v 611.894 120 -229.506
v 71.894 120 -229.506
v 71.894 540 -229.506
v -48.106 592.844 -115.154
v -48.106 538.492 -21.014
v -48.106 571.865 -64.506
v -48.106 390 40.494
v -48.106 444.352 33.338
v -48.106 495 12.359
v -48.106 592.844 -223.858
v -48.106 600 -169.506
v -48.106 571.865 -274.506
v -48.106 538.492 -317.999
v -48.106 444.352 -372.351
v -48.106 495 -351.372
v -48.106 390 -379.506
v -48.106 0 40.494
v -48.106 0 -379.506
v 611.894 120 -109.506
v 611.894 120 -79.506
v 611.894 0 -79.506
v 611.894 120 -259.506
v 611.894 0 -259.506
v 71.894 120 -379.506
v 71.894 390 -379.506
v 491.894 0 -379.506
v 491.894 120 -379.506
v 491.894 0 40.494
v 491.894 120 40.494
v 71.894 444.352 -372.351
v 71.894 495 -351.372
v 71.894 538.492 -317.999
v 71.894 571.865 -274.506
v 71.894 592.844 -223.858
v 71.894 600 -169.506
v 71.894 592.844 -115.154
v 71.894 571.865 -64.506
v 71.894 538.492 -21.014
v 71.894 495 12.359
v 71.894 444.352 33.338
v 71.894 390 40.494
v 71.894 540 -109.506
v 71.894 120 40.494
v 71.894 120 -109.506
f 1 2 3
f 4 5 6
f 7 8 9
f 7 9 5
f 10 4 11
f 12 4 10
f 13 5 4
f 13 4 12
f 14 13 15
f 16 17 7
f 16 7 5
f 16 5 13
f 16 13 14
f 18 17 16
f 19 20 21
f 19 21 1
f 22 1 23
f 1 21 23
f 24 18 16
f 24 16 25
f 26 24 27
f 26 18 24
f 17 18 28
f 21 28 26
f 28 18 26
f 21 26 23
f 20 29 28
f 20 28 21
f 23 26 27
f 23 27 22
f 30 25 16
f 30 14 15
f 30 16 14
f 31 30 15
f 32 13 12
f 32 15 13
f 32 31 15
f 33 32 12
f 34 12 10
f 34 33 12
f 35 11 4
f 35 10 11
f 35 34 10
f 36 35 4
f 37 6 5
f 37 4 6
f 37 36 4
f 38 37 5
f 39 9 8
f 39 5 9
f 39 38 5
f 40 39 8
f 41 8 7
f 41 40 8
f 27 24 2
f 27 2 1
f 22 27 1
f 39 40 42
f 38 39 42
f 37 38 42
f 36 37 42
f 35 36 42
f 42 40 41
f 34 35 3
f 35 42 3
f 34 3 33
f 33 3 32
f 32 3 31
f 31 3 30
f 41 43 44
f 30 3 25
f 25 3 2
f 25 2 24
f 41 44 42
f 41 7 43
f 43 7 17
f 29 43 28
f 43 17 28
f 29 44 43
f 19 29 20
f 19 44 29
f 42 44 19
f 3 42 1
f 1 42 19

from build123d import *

# Parameters (mm, degrees)
SKETCH1_W           = 660
SKETCH1_H           = 420
BOSS_EXTRUDE1_DEPTH = 120
SKETCH2_W           = 120
SKETCH2_H           = 420
BOSS_EXTRUDE2_DEPTH = 480
FILLET1_RADIUS      = 210
FILLET1_LENGTH      = 120
CHAMFER1_START      = 376.454614173
CHAMFER1_OUTLINE_W  = 172
CHAMFER1_OUTLINE_H  = 120
CHAMFER1_DEPTH      = 85.545385827
CHAMFER2_START      = 616.17299772
CHAMFER2_OUTLINE_W  = 173
CHAMFER2_OUTLINE_H  = 120
CHAMFER2_DEPTH      = 85.82700228
SKETCH4_W           = 120
SKETCH4_H           = 420
BOSS_EXTRUDE3_DEPTH = 540
CUT_EXTRUDE1_DEPTH  = 480


with BuildPart() as part:
    # Sketch1 → Boss-Extrude1 (new body)
    with BuildSketch(Plane(origin=(0, 0, 0), x_dir=(1, 0, 0), z_dir=(0, 1, 0))):
        with Locations((281.893715562, 169.506494581)):
            Rectangle(SKETCH1_W, SKETCH1_H)
    extrude(amount=BOSS_EXTRUDE1_DEPTH)

    # Sketch2 → Boss-Extrude2 (add)
    with BuildSketch(Plane(origin=(0, 120, 0), x_dir=(1, 0, 0), z_dir=(0, 1, 0))):
        with Locations((11.893715562, 169.506494581)):
            Rectangle(SKETCH2_W, SKETCH2_H)
    extrude(amount=BOSS_EXTRUDE2_DEPTH)

    # Fillet1: full round fillet: the end face becomes a half cylinder, R = half its width
    fillet1_face = Plane((11.893715562, 600, -169.506494581), x_dir=(1, 0, 0), z_dir=(0, 1, 0))  # on the end face: x along it, z out of the body
    fillet1_slab = fillet1_face.offset(-FILLET1_RADIUS / 2) * Box(FILLET1_LENGTH, 2 * FILLET1_RADIUS, FILLET1_RADIUS, mode=Mode.PRIVATE)  # the body's end, R deep
    fillet1_round = Plane((11.893715562, 390, -169.506494581), x_dir=(0, 1, 0), z_dir=(1, 0, 0)) * Cylinder(FILLET1_RADIUS, FILLET1_LENGTH, mode=Mode.PRIVATE)  # its axis R under the face
    add(fillet1_slab - fillet1_round, mode=Mode.SUBTRACT)

    # Chamfer1: read off the stored shape, not the designer's step
    # Chamfer1 outline → Chamfer1 (cut)
    with BuildSketch(Plane(origin=(0, 0, 0), x_dir=(0.7071067811865471, 0, -0.707106781186548), z_dir=(0.707106781186548, 0, 0.707106781186547)).offset(CHAMFER1_START)):
        with Locations((404, 60)):
            Rectangle(CHAMFER1_OUTLINE_W, CHAMFER1_OUTLINE_H)
    extrude(amount=CHAMFER1_DEPTH, mode=Mode.SUBTRACT)

    # Chamfer2: read off the stored shape, not the designer's step
    # Chamfer2 outline → Chamfer2 (cut)
    with BuildSketch(Plane(origin=(0, 0, 0), x_dir=(0.707106781186548, 0, 0.707106781186547), z_dir=(0.707106781186547, 0, -0.707106781186548)).offset(CHAMFER2_START)):
        with Locations((164.5, -60)):
            Rectangle(CHAMFER2_OUTLINE_W, CHAMFER2_OUTLINE_H)
    extrude(amount=CHAMFER2_DEPTH, mode=Mode.SUBTRACT)

    # Sketch4 → Boss-Extrude3 (add)
    with BuildSketch(Plane(origin=(71.893715562, 0, 0), x_dir=(0, 0, -1), z_dir=(1, 0, 0))):
        with Locations((169.506494581, 330)):
            Rectangle(SKETCH4_W, SKETCH4_H)
    extrude(amount=BOSS_EXTRUDE3_DEPTH)

    # Sketch7 → Cut-Extrude1 (cut)
    with BuildSketch(Plane.XY.offset(-109.506494581)):
        Polygon((71.893715562, 540), (611.893715562, 120), (611.893715562, 540), align=None)
    extrude(amount=-CUT_EXTRUDE1_DEPTH, mode=Mode.SUBTRACT)


solid = part.part
